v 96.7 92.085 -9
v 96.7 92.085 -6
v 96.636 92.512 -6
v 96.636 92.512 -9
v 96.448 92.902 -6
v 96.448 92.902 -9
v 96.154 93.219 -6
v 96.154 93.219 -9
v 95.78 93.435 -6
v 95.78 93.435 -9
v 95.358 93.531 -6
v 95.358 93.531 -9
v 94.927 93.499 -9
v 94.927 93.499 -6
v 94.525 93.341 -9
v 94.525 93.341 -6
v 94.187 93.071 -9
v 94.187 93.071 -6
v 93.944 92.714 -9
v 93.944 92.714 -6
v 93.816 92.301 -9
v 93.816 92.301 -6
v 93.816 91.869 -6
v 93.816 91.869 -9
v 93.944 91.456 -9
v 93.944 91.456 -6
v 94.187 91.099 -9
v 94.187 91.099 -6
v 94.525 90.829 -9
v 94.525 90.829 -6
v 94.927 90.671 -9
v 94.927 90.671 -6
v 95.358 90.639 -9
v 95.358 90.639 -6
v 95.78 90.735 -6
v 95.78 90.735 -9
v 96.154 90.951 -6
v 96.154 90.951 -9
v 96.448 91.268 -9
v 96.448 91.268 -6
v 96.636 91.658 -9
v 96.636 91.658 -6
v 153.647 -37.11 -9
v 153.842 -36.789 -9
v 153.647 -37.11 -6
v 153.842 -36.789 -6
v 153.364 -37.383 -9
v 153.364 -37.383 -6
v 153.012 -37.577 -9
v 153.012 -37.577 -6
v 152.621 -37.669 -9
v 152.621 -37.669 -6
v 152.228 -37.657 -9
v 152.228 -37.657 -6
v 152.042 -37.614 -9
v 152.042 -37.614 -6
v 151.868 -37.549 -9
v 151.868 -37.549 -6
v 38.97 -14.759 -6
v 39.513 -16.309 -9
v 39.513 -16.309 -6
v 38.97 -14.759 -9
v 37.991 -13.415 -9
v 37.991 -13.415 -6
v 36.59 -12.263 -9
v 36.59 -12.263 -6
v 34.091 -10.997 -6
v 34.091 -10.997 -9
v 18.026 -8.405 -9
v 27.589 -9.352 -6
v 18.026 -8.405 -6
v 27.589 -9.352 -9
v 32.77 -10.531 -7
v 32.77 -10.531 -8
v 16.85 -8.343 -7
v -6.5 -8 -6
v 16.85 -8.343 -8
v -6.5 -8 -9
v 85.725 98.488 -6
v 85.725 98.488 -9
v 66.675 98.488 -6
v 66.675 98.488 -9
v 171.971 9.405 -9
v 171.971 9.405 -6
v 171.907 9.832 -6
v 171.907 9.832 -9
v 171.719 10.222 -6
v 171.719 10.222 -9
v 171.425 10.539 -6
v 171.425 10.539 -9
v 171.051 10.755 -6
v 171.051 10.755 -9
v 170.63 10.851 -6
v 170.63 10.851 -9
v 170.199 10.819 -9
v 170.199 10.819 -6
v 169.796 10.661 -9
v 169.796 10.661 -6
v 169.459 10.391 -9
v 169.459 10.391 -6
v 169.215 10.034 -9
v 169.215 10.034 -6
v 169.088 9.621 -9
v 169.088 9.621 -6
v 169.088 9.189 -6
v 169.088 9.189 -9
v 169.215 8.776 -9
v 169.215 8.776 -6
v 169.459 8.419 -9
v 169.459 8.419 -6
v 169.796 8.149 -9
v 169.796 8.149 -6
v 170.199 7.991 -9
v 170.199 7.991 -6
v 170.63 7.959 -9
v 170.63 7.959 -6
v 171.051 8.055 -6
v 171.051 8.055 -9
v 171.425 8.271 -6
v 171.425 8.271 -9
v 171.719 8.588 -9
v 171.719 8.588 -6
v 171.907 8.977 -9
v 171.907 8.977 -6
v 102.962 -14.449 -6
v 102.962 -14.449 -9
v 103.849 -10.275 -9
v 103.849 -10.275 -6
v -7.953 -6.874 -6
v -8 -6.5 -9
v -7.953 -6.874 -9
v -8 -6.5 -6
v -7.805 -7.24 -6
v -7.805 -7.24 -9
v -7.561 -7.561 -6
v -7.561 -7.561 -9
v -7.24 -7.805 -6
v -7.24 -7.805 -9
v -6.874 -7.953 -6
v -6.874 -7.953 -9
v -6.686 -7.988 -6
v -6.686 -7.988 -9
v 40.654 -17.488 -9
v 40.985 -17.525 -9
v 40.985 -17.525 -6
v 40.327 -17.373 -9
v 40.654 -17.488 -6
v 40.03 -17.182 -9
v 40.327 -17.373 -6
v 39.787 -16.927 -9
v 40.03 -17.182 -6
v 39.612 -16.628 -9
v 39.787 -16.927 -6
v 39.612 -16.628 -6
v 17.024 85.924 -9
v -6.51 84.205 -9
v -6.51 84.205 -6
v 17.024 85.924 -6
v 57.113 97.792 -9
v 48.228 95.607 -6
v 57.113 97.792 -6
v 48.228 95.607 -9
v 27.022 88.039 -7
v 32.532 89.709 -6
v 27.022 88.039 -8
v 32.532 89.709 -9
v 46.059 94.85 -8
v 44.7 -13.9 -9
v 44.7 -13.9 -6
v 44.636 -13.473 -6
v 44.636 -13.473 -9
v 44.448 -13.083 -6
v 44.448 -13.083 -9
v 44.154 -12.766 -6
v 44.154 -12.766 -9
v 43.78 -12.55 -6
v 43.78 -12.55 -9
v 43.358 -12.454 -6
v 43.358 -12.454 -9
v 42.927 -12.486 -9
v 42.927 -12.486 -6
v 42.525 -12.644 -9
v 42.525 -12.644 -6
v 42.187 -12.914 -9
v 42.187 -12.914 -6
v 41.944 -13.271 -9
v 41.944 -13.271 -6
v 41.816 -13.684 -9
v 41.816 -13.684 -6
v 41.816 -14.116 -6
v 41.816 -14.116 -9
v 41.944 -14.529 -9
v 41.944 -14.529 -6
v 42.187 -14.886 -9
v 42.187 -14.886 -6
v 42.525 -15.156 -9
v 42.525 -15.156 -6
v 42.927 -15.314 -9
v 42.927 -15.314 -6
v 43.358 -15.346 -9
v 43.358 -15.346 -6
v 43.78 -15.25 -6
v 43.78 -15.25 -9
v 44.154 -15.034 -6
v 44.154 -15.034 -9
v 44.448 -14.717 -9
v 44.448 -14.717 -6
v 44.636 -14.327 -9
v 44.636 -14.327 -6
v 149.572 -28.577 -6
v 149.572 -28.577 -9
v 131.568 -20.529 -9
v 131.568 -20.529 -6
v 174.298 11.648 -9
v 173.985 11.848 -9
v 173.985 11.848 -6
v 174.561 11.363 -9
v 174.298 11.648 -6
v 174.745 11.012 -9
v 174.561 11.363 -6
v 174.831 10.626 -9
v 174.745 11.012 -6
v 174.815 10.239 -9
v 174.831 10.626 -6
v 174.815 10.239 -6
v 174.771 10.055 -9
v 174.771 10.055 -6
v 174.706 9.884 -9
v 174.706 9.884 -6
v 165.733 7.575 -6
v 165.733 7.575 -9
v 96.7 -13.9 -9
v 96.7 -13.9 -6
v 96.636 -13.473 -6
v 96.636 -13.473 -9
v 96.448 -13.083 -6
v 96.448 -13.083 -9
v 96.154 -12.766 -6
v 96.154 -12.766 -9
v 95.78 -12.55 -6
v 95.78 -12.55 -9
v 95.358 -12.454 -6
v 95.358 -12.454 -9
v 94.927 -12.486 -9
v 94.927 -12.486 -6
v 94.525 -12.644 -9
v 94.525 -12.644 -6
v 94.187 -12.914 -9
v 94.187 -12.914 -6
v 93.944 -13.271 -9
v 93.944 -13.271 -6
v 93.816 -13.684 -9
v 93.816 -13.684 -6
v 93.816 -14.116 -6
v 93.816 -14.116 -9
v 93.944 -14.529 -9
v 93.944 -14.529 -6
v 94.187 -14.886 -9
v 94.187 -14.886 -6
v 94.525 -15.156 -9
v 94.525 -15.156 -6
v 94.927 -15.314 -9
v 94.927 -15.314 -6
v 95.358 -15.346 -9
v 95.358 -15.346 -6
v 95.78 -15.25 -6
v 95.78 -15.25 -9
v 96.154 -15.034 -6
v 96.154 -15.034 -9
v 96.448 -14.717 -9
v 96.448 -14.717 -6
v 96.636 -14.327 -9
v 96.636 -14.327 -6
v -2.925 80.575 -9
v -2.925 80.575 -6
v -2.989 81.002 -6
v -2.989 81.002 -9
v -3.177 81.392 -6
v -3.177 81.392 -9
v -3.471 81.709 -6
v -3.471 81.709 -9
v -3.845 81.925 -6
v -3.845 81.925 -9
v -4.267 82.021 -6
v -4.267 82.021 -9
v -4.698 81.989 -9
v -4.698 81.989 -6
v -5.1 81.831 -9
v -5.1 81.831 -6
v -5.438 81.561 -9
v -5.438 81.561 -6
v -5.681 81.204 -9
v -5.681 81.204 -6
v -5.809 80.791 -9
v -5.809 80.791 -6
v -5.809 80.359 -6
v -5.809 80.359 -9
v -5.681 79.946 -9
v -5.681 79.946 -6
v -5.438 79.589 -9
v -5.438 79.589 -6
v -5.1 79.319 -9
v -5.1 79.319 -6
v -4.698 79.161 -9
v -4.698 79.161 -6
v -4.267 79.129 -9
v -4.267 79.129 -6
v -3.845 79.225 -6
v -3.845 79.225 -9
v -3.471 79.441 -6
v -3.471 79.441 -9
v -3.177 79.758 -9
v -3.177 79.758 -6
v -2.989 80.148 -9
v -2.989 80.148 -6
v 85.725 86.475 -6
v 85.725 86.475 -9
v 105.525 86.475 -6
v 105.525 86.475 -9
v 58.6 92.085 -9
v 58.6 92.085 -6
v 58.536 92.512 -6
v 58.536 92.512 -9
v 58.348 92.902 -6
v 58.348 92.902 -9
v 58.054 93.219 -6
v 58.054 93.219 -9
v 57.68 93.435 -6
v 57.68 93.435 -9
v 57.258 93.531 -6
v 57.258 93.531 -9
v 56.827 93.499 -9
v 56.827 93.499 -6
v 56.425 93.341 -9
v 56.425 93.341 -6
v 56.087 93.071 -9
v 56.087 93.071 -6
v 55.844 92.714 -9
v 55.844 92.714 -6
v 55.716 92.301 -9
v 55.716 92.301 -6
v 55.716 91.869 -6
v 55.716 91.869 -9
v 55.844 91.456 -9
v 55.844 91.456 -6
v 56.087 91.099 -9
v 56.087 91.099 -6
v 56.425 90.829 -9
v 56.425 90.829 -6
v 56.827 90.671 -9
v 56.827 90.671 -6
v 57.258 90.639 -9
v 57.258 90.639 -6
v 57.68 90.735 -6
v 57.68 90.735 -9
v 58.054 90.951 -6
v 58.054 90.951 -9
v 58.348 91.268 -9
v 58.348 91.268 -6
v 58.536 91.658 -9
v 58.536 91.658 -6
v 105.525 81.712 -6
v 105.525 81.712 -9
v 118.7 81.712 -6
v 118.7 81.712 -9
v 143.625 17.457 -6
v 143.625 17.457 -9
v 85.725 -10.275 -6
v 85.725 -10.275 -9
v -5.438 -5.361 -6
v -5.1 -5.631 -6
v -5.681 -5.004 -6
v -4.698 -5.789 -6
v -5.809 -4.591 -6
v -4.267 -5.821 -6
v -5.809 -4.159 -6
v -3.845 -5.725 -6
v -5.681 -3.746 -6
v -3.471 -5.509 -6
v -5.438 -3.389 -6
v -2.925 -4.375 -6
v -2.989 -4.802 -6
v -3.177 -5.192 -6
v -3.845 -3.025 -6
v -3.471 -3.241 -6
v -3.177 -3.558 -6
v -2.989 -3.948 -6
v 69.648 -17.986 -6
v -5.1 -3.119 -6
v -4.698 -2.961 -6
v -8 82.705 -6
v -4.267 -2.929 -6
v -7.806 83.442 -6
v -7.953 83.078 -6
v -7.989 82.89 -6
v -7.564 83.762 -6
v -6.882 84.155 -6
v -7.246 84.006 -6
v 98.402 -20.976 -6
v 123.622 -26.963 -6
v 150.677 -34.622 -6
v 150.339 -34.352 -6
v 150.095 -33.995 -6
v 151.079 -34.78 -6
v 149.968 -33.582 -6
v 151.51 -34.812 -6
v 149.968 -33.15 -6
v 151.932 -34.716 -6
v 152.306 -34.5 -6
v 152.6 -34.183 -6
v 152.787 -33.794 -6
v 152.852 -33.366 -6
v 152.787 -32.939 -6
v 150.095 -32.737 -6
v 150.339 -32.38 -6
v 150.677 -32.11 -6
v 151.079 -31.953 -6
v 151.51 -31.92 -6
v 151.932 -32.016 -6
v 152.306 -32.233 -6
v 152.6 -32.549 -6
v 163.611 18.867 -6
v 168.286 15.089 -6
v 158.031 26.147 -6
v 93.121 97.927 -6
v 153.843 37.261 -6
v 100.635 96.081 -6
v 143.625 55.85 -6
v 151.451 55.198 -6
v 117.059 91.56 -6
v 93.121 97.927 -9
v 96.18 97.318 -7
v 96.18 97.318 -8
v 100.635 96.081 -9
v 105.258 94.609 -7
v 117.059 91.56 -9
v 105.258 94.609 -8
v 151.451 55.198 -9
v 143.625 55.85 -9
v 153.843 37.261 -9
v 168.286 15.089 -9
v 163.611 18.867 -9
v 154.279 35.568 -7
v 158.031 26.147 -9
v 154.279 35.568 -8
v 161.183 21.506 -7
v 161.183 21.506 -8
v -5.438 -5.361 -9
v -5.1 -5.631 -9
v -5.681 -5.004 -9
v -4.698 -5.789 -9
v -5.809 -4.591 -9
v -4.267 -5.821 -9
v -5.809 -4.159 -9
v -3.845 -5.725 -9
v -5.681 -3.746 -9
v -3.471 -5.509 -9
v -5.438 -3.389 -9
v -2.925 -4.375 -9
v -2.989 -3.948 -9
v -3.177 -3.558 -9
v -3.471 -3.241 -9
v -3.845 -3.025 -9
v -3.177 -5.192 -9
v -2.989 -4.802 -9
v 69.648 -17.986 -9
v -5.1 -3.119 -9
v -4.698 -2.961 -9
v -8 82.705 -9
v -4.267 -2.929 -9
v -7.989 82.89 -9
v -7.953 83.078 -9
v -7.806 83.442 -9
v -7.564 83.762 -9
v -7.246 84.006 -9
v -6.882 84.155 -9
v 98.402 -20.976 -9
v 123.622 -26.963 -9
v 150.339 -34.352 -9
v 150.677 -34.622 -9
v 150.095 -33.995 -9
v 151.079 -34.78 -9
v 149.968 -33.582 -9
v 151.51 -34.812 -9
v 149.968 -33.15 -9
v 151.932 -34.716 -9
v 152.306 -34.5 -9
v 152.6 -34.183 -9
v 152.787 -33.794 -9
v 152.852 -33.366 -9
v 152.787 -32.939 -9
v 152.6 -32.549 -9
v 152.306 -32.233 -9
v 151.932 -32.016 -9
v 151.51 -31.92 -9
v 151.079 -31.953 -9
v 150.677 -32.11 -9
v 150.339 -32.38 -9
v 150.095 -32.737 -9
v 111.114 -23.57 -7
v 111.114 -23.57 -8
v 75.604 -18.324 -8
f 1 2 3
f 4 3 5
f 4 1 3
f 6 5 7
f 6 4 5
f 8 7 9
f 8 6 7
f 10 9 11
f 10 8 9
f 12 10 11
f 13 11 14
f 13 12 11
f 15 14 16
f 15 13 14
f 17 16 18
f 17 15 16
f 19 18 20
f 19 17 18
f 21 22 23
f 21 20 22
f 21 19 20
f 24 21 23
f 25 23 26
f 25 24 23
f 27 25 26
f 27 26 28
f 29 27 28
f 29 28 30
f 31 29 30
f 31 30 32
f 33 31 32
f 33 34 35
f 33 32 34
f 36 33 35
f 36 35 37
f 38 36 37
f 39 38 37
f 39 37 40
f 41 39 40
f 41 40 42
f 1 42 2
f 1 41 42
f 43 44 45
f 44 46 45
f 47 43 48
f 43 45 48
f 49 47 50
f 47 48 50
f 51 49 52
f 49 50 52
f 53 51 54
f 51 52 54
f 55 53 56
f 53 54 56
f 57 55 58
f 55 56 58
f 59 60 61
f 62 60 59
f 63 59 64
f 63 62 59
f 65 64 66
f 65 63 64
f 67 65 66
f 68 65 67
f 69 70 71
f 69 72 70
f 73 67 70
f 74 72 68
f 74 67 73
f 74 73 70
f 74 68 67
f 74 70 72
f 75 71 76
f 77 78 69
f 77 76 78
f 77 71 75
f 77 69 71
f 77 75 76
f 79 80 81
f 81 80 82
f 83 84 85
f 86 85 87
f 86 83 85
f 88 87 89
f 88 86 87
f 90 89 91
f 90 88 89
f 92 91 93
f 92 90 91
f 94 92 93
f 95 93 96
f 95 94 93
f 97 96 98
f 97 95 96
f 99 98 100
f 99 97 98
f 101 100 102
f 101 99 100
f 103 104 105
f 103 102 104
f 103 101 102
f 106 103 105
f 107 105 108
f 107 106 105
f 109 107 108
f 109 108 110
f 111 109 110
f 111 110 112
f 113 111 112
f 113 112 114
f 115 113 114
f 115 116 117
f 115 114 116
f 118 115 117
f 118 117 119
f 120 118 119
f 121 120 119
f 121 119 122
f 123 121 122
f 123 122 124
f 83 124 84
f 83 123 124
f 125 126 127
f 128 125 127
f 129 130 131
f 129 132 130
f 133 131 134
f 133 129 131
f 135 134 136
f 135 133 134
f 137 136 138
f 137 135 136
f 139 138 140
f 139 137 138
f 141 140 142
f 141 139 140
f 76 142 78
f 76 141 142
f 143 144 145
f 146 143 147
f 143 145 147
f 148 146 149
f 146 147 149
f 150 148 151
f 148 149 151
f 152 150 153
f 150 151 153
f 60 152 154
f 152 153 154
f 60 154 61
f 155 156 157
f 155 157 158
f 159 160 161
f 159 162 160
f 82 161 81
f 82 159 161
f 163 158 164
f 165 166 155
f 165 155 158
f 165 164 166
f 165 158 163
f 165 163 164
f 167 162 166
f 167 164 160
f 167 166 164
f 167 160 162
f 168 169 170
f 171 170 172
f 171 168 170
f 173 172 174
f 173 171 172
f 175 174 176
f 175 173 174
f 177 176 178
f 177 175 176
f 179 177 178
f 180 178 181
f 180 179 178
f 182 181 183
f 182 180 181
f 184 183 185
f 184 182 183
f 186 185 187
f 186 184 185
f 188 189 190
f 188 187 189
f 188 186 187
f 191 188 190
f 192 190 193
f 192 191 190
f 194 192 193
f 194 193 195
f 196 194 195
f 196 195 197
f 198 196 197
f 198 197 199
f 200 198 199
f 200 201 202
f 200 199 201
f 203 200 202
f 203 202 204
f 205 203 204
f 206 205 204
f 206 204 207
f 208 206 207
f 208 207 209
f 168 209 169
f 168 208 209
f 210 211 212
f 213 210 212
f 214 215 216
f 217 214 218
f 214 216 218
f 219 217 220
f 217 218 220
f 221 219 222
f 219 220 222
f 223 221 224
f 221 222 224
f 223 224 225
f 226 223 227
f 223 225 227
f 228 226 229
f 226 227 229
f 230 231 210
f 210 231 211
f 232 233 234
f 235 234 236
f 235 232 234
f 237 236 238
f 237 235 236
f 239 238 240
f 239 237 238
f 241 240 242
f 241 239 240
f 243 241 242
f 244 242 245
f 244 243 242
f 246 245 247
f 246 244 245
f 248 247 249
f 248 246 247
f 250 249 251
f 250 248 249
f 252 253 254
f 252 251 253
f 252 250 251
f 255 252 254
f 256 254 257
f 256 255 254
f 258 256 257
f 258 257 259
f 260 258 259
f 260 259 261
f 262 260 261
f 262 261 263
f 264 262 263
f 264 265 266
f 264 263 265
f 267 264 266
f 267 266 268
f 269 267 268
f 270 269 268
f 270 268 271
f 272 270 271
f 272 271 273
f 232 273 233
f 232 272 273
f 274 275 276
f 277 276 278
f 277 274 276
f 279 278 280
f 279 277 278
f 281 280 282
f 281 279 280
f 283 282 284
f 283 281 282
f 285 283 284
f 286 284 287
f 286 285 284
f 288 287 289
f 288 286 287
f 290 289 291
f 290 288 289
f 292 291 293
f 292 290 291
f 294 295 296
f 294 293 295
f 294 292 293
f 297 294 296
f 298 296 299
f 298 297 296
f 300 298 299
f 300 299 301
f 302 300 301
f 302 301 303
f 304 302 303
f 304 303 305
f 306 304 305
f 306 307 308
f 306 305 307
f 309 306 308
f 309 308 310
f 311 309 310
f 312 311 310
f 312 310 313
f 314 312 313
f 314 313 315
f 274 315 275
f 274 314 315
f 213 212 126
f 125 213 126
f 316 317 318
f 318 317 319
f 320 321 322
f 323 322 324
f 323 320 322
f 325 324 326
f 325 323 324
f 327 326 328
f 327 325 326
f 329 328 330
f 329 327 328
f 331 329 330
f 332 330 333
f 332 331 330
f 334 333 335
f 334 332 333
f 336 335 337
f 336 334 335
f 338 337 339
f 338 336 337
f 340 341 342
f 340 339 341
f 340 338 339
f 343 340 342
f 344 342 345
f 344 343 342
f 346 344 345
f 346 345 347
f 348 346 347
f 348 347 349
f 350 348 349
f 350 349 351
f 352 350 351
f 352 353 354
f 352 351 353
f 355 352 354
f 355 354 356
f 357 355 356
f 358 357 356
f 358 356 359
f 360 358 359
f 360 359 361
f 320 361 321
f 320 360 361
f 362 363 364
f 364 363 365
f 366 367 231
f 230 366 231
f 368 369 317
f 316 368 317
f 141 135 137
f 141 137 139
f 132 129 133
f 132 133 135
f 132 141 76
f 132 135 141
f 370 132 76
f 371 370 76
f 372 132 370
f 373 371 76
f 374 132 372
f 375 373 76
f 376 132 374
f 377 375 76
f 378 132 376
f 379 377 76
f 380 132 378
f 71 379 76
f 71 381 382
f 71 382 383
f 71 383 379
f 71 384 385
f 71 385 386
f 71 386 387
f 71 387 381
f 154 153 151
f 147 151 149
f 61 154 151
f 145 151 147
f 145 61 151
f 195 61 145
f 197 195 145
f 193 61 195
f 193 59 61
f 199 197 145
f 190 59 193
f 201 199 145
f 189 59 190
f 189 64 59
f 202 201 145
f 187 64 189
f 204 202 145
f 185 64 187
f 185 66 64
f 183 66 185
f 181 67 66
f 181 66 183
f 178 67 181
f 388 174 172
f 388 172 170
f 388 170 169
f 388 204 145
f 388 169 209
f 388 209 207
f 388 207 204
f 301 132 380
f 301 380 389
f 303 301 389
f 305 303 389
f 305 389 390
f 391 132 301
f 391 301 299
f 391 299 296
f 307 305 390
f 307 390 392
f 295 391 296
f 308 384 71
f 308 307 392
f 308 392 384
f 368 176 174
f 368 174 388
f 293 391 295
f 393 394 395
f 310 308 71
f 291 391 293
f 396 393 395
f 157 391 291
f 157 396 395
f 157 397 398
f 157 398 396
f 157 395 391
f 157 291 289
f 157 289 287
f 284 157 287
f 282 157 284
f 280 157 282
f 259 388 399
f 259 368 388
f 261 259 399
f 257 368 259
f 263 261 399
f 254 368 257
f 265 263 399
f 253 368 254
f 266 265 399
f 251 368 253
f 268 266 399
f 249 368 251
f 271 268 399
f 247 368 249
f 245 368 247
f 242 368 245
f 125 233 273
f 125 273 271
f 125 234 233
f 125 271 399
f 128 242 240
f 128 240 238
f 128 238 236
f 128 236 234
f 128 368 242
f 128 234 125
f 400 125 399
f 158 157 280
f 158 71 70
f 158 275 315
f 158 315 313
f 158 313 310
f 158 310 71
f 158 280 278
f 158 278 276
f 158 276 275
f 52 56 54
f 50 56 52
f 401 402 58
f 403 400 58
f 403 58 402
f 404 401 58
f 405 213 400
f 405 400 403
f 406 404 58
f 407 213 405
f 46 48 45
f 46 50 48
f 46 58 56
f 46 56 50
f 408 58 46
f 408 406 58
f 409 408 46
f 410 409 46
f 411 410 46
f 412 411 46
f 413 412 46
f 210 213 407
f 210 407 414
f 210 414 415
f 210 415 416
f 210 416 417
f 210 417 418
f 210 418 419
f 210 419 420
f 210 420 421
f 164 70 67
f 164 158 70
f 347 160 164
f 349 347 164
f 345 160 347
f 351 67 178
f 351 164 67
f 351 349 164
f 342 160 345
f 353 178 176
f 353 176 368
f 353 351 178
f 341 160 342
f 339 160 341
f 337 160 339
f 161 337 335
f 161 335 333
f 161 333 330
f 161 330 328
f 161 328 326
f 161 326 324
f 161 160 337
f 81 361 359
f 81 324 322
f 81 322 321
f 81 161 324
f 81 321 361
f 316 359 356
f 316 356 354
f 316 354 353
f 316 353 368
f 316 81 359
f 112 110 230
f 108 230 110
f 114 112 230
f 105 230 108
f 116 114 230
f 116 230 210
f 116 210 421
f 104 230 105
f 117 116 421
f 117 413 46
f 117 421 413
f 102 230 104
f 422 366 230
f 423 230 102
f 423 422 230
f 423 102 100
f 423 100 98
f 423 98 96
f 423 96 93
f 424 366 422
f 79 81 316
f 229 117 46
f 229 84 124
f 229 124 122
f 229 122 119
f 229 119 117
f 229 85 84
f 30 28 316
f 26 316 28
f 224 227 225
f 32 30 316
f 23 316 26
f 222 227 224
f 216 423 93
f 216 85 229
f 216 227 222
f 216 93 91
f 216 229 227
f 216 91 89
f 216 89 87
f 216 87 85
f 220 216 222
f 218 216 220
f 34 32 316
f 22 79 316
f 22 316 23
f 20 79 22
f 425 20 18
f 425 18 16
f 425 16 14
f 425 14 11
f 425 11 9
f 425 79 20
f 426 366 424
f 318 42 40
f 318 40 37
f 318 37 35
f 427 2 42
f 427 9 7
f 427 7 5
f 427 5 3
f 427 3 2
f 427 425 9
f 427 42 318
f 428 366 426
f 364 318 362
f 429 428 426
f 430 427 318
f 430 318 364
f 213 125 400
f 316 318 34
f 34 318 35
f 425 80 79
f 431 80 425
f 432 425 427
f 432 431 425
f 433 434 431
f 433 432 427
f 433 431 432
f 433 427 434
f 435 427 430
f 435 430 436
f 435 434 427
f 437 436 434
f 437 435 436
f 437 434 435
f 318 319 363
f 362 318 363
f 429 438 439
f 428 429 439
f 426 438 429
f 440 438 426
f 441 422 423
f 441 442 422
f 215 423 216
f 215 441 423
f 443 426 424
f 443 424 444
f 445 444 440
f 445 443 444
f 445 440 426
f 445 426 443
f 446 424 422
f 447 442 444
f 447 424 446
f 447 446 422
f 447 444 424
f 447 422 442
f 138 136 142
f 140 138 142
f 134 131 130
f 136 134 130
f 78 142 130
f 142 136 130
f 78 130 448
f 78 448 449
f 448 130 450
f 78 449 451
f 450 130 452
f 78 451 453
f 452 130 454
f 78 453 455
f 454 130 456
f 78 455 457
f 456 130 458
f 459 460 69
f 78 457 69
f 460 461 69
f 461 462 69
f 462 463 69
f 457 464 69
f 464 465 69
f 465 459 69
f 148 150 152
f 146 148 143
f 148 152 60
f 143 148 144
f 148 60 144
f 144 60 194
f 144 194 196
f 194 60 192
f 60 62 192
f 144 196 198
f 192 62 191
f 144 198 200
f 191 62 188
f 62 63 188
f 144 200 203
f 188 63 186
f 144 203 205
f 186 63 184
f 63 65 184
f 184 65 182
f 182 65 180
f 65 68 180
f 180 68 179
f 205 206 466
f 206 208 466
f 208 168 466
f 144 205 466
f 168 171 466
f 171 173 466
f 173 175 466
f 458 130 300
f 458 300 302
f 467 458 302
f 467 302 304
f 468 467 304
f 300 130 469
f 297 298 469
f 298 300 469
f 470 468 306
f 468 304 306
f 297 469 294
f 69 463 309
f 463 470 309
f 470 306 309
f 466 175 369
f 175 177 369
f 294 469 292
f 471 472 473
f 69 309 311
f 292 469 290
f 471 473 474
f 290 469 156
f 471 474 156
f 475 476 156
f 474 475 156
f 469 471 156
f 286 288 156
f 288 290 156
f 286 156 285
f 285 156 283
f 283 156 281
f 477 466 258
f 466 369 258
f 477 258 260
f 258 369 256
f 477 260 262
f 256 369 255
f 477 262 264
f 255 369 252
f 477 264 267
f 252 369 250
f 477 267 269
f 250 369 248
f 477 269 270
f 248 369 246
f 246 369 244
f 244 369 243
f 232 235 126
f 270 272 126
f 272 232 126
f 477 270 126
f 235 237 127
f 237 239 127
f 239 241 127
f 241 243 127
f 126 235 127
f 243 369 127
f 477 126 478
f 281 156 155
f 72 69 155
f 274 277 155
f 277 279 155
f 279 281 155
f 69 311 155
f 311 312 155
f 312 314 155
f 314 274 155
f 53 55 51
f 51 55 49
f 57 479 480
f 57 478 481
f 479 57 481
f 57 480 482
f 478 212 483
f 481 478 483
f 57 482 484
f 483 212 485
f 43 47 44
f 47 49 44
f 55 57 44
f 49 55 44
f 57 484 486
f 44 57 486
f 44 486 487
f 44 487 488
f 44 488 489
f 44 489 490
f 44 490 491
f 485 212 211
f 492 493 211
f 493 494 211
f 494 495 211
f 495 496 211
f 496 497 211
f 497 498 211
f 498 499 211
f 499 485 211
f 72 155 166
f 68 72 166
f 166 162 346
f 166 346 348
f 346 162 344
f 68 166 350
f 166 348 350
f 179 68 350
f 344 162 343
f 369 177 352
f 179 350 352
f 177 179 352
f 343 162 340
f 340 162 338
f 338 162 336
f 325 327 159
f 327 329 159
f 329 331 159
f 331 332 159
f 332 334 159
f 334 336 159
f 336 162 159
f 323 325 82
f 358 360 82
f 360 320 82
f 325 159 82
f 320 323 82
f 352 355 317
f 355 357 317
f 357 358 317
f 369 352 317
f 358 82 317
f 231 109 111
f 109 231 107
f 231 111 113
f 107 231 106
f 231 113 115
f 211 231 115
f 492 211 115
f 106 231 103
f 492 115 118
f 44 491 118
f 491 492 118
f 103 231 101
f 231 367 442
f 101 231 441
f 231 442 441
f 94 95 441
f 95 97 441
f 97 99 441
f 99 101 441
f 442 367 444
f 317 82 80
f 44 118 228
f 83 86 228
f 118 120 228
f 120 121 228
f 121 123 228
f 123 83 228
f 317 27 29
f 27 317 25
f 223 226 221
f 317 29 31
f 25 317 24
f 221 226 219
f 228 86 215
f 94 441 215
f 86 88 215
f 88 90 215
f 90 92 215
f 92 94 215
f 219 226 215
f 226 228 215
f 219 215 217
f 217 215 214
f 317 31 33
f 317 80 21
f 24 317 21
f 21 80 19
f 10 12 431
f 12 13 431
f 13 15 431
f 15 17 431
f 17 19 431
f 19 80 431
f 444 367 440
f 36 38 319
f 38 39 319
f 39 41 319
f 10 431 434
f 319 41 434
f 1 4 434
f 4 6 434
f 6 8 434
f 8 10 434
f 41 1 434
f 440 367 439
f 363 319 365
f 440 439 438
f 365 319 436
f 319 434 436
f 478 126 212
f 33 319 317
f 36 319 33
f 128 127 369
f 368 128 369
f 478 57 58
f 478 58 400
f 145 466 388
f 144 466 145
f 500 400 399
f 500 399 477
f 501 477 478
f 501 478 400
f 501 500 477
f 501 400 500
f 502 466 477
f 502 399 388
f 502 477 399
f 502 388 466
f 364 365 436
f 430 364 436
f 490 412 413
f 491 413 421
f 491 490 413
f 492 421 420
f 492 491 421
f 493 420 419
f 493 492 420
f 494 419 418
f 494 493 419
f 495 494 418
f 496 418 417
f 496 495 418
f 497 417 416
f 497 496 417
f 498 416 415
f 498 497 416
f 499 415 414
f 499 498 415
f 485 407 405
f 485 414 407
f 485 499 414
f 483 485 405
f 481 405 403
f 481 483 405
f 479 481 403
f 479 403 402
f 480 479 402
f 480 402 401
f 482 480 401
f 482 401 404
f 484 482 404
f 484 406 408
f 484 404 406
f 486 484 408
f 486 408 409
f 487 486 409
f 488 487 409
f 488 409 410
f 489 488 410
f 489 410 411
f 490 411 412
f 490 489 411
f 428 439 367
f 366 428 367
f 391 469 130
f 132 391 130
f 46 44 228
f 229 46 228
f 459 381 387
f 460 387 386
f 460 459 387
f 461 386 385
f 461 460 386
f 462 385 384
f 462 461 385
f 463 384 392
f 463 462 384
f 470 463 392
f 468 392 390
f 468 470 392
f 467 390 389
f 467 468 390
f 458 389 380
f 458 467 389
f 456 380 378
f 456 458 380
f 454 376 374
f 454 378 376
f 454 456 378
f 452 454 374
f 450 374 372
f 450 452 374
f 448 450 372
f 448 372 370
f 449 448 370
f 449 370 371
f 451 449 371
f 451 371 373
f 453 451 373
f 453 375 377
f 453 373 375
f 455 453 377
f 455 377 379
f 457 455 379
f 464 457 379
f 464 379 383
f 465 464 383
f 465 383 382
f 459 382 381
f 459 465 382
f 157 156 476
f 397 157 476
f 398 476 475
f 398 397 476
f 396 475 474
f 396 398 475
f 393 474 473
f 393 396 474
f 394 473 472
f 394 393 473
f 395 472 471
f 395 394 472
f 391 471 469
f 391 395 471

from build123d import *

# Parameters (mm, degrees)
PAD007_DEPTH    = 3
POCKET010_DEPTH = 5
SKETCH042_R     = 1.45
POCKET018_DEPTH = 16
POCKET024_DEPTH = 19
FILLET005_R     = 1.5


with BuildPart() as part:
    # Sketch029 → Pad007 (new body)
    with BuildSketch(Plane.XY):
        with BuildLine():
            Line((85.725, 98.4875), (66.675, 98.4875))
            add(Edge.make_bspline(
                [(-8, 84.2), (39.625, 84.2), (39.625, 98.4875), (66.675, 98.4875)],
                knots=[0, 0, 0, 0, 1, 1, 1, 1], degree=3))
            Line((-8, 84.2), (-8, -8))
            add(Edge.make_bspline(
                [(39.625, -17.525), (39.625, -8), (20.575, -8), (-8, -8)],
                knots=[0, 0, 0, 0, 1, 1, 1, 1], degree=3))
            add(Edge.make_bspline(
                [(153.231854, -38.154949), (107.082107, -17.525), (76.2, -17.525), (39.625, -17.525)],
                knots=[0, 0, 0, 0, 1, 1, 1, 1], degree=3))
            Line((153.231854, -38.154949), (175.310198, 11.234895))
            add(Edge.make_bspline(
                [(150.875, 88.9625), (150.875, 42.8625), (150.875, 22.157965), (175.310198, 11.234895)],
                knots=[0, 0, 0, 0, 1, 1, 1, 1], degree=3))
            add(Edge.make_bspline(
                [(85.725, 98.4875), (104.775, 98.4875), (104.775, 88.9625), (150.875, 88.9625)],
                knots=[0, 0, 0, 0, 1, 1, 1, 1], degree=3))
        make_face()
    extrude(amount=PAD007_DEPTH)

    # Sketch028 → Pocket010 (cut)
    with BuildSketch(Plane(origin=(0, 0, 0), x_dir=(1, 0, 0), z_dir=(0, 0, -1))):
        Polygon((85.725, -86.475), (105.525, -86.475), (105.525, -81.7125), (143.625, -81.7125), (143.625, -17.457464), (165.732668, -7.574851), (149.57181, 28.577419), (131.568158, 20.529392), (102.96164, 14.448889), (103.848827, 10.275), (85.725, 10.275), align=None)
    extrude(amount=-POCKET010_DEPTH, mode=Mode.SUBTRACT)

    # Sketch042 → Pocket018 (cut)
    with BuildSketch(Plane.XY):
        with Locations((-4.375, -4.375)):
            Circle(SKETCH042_R)
        with Locations((-4.375, 80.575)):
            Circle(SKETCH042_R)
        with Locations((151.401832, -33.366184)):
            Circle(SKETCH042_R)
        with Locations((170.521433, 9.404873)):
            Circle(SKETCH042_R)
        with Locations((147.25, 85.3375)):
            Circle(SKETCH042_R)
        with Locations((43.25, -13.9)):
            Circle(SKETCH042_R)
        with Locations((57.15, 92.085)):
            Circle(SKETCH042_R)
        with Locations((95.25, 92.085)):
            Circle(SKETCH042_R)
        with Locations((95.25, -13.9)):
            Circle(SKETCH042_R)
    extrude(amount=POCKET018_DEPTH, mode=Mode.SUBTRACT)

    # Sketch050 → Pocket024 (cut)
    with BuildSketch(Plane.XY):
        Polygon((118.825, 80.9625), (116.825, 92.9625), (166.907578, 98.346489), (154.875, 54.9125), (142.875, 55.9125), align=None)
    extrude(amount=POCKET024_DEPTH, mode=Mode.SUBTRACT)

    # Fillet005
    fillet005_edges = [part.edges().sort_by_distance(p)[0] for p in [
        (-8, 84.2, 1.5),
        (-8, -8, 1.5),
        (39.625, -17.525, 1.5),
        (153.231854, -38.154949, 1.5),
        (175.310198, 11.234895, 1.5),
    ]]
    fillet(fillet005_edges, radius=FILLET005_R)


with BuildPart() as part_1:
    # Body006 placement: moved
    add(part.part.moved(Location((0, 0, -9))))


solid = part_1.part
